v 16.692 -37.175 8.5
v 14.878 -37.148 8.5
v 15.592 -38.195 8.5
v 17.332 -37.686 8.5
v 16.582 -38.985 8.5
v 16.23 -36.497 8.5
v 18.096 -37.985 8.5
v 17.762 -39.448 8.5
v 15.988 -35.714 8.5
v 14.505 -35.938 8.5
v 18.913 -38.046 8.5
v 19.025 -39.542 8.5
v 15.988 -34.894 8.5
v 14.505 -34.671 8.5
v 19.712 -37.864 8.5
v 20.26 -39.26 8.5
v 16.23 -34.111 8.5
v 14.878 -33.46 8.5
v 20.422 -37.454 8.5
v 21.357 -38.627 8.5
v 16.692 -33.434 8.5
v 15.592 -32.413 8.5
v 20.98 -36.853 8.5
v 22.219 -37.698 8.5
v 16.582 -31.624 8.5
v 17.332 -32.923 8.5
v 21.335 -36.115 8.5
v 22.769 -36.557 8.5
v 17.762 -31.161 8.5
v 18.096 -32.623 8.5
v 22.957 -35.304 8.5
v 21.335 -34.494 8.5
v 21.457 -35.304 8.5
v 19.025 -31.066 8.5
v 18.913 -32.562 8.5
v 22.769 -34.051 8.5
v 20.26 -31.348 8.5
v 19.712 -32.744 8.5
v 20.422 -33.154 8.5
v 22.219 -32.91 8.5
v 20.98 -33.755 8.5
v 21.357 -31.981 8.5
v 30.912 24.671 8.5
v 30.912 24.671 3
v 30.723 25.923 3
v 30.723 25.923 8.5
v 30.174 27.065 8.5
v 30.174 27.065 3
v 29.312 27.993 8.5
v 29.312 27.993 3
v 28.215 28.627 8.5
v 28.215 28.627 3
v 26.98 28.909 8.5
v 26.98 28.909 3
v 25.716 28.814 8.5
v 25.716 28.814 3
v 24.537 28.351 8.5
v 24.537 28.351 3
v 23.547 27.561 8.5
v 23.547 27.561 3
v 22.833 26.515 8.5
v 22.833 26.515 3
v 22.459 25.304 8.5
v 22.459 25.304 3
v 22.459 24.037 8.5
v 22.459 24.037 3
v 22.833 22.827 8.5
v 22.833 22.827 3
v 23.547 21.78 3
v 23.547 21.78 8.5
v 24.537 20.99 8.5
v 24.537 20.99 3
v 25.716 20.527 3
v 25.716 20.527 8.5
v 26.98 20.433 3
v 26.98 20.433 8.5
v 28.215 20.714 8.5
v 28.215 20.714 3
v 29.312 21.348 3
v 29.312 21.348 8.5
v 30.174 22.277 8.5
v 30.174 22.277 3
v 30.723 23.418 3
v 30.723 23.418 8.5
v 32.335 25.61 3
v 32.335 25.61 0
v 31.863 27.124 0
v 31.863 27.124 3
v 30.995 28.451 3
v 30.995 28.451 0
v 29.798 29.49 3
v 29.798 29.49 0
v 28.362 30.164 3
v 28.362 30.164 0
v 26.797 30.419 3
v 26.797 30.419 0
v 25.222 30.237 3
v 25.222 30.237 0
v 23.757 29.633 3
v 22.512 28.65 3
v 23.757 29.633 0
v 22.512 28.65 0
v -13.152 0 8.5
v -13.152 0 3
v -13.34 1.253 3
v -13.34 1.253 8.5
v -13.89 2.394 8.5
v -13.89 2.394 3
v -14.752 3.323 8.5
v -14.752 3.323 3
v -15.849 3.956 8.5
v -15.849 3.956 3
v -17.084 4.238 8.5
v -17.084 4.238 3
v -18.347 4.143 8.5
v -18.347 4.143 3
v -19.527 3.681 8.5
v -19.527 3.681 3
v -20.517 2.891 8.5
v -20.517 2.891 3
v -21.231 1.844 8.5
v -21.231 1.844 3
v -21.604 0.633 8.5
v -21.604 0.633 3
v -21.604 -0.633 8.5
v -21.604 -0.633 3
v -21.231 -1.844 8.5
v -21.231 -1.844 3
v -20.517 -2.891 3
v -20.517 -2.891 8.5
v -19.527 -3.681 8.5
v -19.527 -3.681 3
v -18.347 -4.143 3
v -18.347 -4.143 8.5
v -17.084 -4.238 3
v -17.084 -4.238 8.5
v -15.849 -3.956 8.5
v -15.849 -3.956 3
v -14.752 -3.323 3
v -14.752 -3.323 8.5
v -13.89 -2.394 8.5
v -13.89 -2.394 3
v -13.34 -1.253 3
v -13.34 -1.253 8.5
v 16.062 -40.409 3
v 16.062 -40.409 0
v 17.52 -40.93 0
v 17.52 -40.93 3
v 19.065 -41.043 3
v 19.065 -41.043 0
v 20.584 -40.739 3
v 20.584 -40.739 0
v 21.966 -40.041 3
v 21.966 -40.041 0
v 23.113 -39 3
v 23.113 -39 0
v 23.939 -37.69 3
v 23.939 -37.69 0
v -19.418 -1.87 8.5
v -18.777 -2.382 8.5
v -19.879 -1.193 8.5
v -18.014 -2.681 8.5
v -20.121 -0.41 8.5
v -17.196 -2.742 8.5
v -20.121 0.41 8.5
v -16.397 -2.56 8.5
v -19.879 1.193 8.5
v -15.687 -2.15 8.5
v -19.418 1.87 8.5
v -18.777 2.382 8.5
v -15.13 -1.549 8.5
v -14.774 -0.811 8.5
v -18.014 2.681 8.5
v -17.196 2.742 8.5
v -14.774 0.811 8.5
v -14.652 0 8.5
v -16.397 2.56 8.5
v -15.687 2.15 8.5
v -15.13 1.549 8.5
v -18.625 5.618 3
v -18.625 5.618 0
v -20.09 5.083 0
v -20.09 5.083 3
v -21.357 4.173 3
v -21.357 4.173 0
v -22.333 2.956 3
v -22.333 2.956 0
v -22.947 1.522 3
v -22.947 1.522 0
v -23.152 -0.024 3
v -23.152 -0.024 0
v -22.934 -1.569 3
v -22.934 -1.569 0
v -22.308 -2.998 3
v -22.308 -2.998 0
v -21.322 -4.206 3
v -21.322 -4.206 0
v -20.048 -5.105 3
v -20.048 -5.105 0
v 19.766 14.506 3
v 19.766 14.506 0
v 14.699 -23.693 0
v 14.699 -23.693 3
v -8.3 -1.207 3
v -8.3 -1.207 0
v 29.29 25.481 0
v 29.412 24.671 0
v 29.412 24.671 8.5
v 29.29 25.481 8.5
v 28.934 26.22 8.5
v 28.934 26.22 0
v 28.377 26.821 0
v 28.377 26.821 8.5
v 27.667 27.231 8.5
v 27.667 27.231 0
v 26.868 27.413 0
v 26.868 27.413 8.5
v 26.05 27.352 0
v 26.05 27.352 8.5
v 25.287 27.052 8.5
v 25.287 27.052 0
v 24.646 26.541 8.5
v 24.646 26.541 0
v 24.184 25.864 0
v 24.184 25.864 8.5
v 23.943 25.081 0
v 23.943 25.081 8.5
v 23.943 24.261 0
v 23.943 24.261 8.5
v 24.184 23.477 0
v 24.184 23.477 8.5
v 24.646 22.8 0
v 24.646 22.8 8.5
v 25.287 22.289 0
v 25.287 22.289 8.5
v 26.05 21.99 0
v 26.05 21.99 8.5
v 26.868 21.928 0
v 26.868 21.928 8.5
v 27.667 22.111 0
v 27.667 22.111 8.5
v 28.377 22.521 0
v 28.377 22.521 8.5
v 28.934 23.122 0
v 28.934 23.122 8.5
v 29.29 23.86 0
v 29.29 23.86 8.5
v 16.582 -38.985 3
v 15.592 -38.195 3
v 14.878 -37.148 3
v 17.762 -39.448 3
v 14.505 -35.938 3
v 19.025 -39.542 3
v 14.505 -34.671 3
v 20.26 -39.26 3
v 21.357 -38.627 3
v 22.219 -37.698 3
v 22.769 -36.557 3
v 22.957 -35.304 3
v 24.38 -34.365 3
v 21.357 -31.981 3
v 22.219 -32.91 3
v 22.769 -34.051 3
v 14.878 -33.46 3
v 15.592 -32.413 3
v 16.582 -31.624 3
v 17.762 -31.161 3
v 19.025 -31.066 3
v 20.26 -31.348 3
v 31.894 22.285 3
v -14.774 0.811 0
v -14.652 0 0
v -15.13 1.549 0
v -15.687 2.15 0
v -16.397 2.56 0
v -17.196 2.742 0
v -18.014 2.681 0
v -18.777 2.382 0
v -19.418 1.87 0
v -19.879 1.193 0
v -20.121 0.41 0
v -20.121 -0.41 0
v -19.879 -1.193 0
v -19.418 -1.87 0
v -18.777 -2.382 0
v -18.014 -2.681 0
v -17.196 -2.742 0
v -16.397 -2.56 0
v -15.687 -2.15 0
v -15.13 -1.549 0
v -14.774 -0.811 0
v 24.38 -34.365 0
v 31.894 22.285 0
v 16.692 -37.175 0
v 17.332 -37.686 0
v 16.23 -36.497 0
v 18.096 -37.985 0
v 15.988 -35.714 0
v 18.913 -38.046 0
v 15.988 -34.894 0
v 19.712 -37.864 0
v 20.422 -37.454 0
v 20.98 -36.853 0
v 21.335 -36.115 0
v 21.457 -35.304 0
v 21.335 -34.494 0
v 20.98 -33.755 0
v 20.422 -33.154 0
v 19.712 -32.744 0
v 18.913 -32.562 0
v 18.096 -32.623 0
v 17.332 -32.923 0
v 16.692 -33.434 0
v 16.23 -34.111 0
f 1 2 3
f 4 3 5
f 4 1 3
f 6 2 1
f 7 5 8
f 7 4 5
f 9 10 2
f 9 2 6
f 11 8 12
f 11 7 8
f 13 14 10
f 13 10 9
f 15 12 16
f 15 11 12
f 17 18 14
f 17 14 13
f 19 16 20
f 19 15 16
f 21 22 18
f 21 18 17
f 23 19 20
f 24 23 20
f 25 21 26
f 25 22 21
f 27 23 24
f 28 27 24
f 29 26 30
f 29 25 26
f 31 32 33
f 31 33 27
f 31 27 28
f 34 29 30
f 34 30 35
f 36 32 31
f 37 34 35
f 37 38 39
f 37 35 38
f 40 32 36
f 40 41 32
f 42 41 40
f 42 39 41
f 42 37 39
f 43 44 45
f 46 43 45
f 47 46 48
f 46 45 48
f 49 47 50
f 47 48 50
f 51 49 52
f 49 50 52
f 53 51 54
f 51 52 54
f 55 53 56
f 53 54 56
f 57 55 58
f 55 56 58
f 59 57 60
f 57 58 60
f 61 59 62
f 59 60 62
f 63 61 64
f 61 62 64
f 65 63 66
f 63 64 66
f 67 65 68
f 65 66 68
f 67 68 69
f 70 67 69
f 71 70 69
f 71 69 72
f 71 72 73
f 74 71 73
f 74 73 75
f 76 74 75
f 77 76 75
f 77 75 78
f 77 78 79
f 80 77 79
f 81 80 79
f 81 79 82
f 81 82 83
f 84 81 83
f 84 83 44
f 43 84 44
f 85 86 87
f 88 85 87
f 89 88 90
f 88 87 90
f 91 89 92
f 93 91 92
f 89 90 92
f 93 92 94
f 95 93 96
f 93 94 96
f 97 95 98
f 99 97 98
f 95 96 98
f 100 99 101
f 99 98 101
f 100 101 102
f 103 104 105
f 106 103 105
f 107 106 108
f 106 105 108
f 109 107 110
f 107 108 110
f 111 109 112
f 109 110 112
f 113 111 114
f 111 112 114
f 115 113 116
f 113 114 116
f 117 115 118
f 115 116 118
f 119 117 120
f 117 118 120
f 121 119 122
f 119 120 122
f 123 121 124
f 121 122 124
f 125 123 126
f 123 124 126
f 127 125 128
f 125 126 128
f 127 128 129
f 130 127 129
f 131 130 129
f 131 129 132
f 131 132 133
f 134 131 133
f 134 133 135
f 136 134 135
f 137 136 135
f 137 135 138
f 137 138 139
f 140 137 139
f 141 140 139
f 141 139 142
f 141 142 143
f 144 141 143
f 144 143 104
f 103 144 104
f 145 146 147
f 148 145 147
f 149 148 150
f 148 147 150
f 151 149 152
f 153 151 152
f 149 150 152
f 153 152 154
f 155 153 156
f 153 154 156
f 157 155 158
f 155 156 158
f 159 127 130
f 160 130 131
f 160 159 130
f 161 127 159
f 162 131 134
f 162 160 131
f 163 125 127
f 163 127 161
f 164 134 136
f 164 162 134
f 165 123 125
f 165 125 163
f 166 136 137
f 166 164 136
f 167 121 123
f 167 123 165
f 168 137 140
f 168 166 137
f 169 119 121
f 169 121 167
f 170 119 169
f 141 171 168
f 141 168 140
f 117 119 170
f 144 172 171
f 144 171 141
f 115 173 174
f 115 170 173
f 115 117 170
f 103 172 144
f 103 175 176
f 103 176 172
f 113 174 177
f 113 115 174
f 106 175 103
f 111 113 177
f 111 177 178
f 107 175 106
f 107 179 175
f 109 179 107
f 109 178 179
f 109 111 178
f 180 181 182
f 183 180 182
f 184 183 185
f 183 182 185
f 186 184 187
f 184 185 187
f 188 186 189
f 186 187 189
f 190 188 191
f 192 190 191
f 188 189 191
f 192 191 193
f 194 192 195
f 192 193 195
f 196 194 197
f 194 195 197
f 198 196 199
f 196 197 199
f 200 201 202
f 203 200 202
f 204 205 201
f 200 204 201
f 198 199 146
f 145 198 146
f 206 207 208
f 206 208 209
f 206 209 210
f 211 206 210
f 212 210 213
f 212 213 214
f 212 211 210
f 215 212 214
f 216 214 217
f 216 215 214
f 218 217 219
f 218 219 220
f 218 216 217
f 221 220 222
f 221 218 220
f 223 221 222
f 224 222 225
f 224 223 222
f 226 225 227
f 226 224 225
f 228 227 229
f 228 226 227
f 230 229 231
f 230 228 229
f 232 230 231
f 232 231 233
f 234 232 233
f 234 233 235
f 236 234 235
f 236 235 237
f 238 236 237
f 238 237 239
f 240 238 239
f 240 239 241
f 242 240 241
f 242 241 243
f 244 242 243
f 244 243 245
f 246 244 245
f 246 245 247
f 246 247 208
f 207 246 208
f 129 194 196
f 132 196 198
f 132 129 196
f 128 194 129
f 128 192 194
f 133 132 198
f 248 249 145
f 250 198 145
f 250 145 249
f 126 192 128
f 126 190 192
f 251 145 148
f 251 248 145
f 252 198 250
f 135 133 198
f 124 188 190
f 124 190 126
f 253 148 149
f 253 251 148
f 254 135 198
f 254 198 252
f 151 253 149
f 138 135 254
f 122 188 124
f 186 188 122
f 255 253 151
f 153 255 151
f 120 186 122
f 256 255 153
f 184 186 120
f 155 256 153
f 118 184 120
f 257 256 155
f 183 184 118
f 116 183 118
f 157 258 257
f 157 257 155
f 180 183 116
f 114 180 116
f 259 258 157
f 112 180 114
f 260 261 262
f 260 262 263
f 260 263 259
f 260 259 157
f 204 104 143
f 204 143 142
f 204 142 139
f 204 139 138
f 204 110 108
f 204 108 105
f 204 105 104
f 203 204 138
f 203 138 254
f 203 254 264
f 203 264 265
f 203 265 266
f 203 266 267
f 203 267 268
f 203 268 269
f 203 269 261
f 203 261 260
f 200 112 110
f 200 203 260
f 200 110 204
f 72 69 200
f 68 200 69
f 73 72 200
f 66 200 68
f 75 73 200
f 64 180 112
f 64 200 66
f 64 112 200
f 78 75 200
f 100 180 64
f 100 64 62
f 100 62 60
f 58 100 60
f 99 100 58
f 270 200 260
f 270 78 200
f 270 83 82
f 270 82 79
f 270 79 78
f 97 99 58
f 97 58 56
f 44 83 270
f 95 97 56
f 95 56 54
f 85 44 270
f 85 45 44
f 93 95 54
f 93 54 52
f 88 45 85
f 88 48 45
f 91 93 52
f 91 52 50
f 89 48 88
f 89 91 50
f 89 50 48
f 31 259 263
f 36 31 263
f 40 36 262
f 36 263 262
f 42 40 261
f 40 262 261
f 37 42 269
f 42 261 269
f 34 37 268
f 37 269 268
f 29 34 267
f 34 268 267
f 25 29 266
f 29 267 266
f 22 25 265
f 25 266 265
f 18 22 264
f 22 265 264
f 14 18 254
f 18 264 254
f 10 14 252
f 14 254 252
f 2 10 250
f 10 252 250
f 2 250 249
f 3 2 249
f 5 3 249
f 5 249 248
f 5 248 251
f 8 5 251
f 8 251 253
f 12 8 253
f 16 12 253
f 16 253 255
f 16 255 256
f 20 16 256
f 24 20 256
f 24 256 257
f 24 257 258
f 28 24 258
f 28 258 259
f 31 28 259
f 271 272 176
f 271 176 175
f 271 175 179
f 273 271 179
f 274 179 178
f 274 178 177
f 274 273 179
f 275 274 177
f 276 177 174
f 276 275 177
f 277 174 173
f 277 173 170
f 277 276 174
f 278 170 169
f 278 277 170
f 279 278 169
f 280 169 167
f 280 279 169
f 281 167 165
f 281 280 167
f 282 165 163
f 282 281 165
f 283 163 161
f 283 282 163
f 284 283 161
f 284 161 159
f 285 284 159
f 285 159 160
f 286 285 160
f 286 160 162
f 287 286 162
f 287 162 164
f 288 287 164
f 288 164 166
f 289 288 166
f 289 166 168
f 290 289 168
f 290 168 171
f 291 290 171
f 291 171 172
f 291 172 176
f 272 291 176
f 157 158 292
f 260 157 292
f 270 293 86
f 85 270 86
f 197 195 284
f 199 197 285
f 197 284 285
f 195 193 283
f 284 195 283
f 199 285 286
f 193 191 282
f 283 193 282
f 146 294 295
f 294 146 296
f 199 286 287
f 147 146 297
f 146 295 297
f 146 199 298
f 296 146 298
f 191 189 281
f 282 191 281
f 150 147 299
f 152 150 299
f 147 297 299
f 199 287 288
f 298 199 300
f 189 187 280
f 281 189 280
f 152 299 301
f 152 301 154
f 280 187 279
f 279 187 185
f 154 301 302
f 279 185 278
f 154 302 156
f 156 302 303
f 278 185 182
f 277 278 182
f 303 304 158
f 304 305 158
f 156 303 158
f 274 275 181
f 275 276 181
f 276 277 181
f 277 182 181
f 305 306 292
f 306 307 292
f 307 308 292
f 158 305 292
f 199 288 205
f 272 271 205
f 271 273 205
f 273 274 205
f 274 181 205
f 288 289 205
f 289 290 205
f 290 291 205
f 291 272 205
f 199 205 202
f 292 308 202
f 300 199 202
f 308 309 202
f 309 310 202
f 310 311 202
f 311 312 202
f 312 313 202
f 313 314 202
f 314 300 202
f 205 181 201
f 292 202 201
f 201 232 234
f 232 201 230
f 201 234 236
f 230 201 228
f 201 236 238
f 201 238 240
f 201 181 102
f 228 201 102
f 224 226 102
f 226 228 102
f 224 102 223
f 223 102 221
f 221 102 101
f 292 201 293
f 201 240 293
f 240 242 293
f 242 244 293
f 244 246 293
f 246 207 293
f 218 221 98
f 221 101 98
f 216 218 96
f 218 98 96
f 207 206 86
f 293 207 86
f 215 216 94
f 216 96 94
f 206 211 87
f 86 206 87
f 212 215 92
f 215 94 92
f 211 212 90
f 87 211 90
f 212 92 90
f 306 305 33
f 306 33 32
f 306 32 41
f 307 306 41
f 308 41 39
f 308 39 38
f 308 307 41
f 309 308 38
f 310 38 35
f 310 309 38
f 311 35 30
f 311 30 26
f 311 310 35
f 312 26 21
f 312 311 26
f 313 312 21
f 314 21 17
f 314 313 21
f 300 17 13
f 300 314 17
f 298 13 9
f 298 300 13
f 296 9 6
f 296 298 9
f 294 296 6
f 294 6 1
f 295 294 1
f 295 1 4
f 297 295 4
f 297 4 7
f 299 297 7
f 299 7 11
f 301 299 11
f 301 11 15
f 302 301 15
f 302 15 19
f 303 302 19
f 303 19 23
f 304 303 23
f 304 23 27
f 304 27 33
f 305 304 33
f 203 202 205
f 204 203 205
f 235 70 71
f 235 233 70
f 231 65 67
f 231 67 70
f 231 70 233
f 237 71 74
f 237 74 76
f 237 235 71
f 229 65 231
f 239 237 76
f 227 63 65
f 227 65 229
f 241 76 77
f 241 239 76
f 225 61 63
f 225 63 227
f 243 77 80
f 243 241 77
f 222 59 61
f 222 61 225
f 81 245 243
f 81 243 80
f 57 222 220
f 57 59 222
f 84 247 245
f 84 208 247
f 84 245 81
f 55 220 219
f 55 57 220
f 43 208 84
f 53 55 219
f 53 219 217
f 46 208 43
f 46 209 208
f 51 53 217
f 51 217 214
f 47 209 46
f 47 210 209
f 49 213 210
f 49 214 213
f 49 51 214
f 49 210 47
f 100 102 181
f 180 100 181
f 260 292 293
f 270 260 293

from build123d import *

# Parameters (mm, degrees)
F0_R     = 4.25
F0_R_2   = 2.75
F1_DEPTH = 3
F2_DEPTH = 8.5


# Not quite as in the source:
# - a feature names something its author has since deleted; it is built from what else it names


with BuildPart() as f1:
    # F0 (on Top) → F1 (new body)
    with BuildSketch(Plane.XY):
        with BuildLine():
            ThreePointArc((-20.0475404255, -5.1050880284), (-14.4143064726, -4.9130538455), (-11.6516802209, 0))
            ThreePointArc((-11.6516802209, 0), (-13.7942703105, 4.4776214376), (-18.6252780431, 5.6183011996))
            ThreePointArc((-18.6252780431, 5.6183011996), (-23.1017631579, 0.7560122426), (-20.0475404255, -5.1050880284))
        make_face()
        with Locations((-17.4016802209, 0)):
            Circle(F0_R, mode=Mode.SUBTRACT)
        with BuildLine():
            ThreePointArc((-18.6252780431, 5.6183011996), (-13.7942703105, 4.4776214376), (-11.6516802209, 0))
            ThreePointArc((-11.6516802209, 0), (-14.4143064726, -4.9130538455), (-20.0475404255, -5.1050880284))
            Line((-20.0475404255, -5.1050880284), (13.6632948995, -38.0643911727))
            ThreePointArc((13.6632948995, -38.0643911727), (16.8311240547, -29.8688761508), (24.3801958358, -34.3647768698))
            Line((24.3801958358, -34.3647768698), (31.8937613277, 22.2850285764))
            ThreePointArc((31.8937613277, 22.2850285764), (23.4337103416, 19.9124465773), (22.5117964167, 28.6503915729))
            Line((22.5117964167, 28.6503915729), (-18.6252780431, 5.6183011996))
        make_face()
        Polygon((14.6992403306, -23.6933170767), (-8.2995714993, -1.2072290356), (19.7657026362, 14.5061375255), align=None, mode=Mode.SUBTRACT)
        with BuildLine():
            ThreePointArc((32.3347594316, 25.6100088156), (28.3621582746, 30.1635639823), (22.5117964167, 28.6503915729))
            ThreePointArc((22.5117964167, 28.6503915729), (23.4337103416, 19.9124465773), (31.8937613277, 22.2850285764))
            Line((31.8937613277, 22.2850285764), (32.3347594316, 25.6100088156))
        make_face()
        with Locations((26.6620065254, 24.670660922)):
            Circle(F0_R, mode=Mode.SUBTRACT)
        with BuildLine():
            ThreePointArc((24.3801958358, -34.3647768698), (16.8311240547, -29.8688761508), (13.6632948995, -38.0643911727))
            Line((13.6632948995, -38.0643911727), (16.0615827249, -40.4092127917))
            ThreePointArc((16.0615827249, -40.4092127917), (20.5837618045, -40.7393733758), (23.9391977319, -37.6897571089))
            Line((23.9391977319, -37.6897571089), (24.3801958358, -34.3647768698))
        make_face()
        with Locations((18.7074429296, -35.3041247633)):
            Circle(F0_R, mode=Mode.SUBTRACT)
        with Locations((-17.4016802209, 0)):
            Circle(F0_R)
        with Locations((-17.4016802209, 0)):
            Circle(F0_R_2, mode=Mode.SUBTRACT)
        with Locations((26.6620065254, 24.670660922)):
            Circle(F0_R)
        with Locations((26.6620065254, 24.670660922)):
            Circle(F0_R_2, mode=Mode.SUBTRACT)
        with Locations((18.7074429296, -35.3041247633)):
            Circle(F0_R)
        with Locations((18.7074429296, -35.3041247633)):
            Circle(F0_R_2, mode=Mode.SUBTRACT)
    extrude(amount=F1_DEPTH)

    # F0 (on Top) → F2 (join)
    with BuildSketch(Plane.XY):
        with Locations((26.6620065254, 24.670660922)):
            Circle(F0_R)
        with Locations((26.6620065254, 24.670660922)):
            Circle(F0_R_2, mode=Mode.SUBTRACT)
        with Locations((-17.4016802209, 0)):
            Circle(F0_R)
        with Locations((-17.4016802209, 0)):
            Circle(F0_R_2, mode=Mode.SUBTRACT)
        with Locations((18.7074429296, -35.3041247633)):
            Circle(F0_R)
        with Locations((18.7074429296, -35.3041247633)):
            Circle(F0_R_2, mode=Mode.SUBTRACT)
    extrude(amount=F2_DEPTH)


solid = f1.part
